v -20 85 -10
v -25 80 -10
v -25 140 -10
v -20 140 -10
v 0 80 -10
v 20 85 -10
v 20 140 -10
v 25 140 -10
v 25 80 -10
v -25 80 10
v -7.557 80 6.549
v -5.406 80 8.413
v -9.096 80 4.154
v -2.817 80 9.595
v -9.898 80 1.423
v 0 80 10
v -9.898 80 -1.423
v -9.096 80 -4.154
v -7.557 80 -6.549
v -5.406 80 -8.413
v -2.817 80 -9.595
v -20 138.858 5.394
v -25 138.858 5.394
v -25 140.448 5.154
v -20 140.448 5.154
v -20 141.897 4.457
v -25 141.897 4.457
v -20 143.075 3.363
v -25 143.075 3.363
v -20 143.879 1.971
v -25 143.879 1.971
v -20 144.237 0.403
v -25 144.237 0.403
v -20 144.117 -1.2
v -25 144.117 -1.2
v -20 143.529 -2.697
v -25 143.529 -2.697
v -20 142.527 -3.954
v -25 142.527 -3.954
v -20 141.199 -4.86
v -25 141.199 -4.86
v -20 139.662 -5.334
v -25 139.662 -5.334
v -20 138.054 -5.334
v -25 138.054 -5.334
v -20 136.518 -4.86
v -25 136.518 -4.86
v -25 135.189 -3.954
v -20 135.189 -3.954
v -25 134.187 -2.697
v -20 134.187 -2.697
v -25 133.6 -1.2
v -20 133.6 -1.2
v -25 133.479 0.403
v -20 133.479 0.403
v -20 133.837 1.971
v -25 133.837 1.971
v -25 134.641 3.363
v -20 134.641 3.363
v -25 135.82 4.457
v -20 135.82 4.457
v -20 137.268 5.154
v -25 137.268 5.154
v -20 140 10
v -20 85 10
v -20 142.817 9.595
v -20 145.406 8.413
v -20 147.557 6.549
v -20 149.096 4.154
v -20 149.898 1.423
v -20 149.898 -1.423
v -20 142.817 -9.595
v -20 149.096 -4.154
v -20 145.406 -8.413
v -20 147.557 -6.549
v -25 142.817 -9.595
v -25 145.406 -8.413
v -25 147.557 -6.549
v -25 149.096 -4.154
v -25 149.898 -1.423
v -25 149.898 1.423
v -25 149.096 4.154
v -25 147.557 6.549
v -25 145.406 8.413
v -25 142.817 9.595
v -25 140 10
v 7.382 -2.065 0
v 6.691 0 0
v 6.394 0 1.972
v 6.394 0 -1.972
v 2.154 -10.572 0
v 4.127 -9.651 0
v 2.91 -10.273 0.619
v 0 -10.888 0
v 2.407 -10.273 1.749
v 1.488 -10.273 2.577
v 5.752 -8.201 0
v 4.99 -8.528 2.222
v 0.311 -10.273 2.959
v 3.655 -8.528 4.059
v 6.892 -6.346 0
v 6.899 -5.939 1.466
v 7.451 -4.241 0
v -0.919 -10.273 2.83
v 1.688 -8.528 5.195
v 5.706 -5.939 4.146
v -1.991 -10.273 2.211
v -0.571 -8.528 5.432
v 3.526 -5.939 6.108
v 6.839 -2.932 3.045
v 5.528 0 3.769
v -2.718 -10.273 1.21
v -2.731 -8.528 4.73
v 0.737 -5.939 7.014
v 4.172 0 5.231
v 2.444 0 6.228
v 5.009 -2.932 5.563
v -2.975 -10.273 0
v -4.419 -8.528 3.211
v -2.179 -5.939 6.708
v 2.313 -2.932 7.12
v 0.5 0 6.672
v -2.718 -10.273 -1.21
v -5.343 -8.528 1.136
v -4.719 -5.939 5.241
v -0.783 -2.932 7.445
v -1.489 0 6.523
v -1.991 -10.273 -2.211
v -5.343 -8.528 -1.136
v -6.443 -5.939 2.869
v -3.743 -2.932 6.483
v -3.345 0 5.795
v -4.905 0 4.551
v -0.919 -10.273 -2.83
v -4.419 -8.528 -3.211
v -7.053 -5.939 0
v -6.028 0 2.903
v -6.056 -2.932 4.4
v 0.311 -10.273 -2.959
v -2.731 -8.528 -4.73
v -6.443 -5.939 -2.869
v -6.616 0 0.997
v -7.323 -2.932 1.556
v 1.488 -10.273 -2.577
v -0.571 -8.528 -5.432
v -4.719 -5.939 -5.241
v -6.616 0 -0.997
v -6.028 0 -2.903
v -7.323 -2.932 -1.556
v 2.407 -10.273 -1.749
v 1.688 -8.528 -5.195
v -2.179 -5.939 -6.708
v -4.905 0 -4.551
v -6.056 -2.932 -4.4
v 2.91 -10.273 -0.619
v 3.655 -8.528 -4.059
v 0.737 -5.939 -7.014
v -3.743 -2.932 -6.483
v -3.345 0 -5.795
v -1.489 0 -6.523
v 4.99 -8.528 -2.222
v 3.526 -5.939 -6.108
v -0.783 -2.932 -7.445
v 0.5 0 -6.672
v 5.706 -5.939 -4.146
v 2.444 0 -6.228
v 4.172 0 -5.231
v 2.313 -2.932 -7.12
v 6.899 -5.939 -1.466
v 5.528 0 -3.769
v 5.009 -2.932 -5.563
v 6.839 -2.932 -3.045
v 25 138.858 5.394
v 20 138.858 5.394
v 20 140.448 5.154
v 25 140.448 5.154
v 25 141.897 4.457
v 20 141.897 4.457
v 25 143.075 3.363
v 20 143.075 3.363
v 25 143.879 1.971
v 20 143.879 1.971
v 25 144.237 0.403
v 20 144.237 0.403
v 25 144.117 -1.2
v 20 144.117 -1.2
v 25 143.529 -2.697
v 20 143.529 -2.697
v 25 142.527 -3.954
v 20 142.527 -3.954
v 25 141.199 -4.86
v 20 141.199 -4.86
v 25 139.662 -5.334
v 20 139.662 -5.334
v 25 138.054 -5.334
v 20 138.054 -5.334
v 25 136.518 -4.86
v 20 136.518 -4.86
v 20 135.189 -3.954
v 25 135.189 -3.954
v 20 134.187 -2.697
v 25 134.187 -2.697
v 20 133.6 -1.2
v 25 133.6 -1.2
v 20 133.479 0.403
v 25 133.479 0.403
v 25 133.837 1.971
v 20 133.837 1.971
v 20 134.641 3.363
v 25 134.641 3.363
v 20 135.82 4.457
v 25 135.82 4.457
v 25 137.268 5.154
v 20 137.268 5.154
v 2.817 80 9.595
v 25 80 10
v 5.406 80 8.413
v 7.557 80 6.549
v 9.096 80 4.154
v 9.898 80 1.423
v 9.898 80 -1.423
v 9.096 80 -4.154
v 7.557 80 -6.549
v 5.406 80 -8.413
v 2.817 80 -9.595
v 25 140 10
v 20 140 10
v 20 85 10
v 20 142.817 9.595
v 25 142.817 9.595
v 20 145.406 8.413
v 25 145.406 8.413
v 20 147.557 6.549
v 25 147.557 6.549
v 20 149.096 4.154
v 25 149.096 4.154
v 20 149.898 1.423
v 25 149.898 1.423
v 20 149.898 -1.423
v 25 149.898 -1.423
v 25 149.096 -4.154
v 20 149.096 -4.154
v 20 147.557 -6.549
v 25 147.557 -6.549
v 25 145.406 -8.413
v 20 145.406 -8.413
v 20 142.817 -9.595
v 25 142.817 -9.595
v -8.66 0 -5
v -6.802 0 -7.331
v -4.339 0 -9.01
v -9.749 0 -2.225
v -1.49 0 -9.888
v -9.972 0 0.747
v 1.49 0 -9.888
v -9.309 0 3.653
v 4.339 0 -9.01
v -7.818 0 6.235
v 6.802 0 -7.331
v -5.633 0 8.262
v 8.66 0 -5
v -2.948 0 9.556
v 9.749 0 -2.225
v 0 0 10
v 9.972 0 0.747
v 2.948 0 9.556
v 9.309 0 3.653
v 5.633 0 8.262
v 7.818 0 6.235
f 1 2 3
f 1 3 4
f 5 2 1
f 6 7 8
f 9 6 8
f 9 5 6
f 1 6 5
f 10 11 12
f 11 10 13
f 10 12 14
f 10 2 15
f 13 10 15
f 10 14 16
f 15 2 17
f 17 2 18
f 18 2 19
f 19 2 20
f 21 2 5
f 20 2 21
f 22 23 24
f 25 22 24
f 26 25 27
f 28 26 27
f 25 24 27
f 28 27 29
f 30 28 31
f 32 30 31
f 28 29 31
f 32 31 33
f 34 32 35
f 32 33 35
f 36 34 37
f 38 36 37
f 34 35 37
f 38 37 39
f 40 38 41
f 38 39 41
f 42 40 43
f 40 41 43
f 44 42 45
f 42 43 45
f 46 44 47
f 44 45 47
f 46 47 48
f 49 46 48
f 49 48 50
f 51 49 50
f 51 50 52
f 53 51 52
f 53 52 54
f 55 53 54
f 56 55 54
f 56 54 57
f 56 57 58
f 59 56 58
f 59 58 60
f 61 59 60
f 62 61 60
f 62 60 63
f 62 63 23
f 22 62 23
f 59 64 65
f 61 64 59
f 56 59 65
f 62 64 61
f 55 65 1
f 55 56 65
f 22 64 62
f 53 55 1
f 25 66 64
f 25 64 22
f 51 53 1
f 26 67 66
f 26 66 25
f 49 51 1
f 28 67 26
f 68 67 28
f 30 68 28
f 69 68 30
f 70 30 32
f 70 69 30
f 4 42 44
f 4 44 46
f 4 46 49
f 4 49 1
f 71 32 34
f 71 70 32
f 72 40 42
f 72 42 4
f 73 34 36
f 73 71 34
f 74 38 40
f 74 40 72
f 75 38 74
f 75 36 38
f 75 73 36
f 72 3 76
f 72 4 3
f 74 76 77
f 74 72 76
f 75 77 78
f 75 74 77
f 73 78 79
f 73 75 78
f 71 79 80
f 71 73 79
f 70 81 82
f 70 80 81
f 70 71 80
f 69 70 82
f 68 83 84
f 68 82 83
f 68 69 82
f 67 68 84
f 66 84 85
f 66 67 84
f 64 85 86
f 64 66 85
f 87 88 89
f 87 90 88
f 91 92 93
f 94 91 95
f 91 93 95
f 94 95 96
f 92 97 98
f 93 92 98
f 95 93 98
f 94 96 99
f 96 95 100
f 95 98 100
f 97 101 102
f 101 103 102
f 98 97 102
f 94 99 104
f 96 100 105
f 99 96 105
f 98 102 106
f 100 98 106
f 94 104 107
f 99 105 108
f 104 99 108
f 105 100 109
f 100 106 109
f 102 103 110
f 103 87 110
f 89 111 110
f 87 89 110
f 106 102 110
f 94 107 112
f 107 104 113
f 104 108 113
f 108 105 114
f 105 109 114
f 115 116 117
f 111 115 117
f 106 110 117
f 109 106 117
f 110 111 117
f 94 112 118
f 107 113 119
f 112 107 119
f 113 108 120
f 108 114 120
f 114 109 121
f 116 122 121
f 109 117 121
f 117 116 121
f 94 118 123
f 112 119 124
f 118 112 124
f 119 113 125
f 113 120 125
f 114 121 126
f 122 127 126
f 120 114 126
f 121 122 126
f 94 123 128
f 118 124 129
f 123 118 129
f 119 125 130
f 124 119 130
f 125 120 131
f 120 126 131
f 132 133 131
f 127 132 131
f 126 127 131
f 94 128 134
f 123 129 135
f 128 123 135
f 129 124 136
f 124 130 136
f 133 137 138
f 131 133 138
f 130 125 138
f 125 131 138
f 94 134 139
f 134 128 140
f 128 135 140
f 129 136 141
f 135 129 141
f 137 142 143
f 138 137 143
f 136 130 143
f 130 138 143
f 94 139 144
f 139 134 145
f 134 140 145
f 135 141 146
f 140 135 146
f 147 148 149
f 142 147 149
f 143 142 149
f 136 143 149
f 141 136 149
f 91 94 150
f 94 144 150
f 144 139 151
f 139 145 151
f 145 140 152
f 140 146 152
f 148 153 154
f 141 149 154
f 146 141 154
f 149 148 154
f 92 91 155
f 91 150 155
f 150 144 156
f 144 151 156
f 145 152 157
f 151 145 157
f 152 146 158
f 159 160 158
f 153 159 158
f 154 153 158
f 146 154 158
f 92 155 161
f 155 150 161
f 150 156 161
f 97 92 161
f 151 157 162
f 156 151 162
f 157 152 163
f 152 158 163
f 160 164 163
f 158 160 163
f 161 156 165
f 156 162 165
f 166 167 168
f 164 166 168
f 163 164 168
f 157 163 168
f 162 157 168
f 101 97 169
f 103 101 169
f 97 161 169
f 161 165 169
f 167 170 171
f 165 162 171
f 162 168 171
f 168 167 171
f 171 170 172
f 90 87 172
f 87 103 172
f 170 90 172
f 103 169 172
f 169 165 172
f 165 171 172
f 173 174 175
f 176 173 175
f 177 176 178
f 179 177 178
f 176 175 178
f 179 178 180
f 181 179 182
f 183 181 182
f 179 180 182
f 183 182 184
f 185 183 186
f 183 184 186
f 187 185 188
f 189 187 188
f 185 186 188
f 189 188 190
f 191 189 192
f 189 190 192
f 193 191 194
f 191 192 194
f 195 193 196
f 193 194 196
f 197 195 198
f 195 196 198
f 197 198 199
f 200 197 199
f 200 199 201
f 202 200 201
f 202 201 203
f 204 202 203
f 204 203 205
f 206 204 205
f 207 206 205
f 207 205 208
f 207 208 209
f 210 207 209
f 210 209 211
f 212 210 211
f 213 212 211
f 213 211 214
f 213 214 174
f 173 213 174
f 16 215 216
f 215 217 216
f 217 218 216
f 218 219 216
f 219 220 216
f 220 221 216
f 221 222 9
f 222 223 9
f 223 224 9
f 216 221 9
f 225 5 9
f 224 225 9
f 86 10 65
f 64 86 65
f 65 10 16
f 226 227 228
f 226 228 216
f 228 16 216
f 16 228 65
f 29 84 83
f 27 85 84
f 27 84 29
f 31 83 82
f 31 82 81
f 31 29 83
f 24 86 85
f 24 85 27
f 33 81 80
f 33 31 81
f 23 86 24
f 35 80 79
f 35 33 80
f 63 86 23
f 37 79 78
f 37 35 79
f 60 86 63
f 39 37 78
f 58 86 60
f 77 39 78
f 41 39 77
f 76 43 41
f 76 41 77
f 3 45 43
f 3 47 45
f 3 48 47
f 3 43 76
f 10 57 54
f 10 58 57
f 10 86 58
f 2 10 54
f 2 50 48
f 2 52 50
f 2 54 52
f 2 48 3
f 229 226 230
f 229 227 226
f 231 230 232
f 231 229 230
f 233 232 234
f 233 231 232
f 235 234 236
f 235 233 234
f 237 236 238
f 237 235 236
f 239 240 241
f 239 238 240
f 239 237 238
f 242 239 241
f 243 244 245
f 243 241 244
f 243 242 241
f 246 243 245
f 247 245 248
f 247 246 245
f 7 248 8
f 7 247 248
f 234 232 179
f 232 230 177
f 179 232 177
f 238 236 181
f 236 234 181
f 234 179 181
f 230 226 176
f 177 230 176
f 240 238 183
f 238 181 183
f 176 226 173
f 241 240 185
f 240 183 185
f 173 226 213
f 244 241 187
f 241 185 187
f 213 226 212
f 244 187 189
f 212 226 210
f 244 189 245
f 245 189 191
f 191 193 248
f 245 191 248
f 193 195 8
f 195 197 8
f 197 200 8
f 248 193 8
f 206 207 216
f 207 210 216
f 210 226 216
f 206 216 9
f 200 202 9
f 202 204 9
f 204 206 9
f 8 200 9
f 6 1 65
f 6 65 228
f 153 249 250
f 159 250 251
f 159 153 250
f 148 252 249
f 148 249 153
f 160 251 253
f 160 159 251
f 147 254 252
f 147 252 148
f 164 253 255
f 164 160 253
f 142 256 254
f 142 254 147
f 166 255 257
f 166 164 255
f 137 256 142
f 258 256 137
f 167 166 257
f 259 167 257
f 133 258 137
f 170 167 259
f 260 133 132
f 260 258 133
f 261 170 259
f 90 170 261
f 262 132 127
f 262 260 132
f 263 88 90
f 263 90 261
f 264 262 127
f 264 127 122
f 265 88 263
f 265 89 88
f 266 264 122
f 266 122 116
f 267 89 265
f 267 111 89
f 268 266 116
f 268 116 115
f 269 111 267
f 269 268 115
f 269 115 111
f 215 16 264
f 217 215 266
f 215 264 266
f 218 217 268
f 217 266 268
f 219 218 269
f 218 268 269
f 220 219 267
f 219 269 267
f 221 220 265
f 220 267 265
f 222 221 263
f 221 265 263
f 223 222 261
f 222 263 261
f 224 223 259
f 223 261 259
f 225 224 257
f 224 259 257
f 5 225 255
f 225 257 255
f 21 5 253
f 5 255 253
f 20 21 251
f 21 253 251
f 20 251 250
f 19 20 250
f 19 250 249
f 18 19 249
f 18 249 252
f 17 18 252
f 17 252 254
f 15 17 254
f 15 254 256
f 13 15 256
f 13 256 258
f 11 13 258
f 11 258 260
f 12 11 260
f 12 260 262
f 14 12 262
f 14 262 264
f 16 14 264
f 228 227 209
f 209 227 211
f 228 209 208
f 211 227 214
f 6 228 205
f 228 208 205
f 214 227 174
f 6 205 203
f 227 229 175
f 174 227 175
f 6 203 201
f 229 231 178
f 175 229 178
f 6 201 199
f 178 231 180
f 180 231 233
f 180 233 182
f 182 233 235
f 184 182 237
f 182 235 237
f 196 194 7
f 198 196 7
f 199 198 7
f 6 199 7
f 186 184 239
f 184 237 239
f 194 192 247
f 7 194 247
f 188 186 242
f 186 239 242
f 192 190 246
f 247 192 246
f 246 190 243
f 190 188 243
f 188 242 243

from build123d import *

# Parameters (mm, degrees)
SKETCH_1_R          = 10
SKETCH_1_R_2        = 7.5
EXTRUDE_1_DEPTH     = 80
SKETCH_2_W          = 50
SKETCH_2_H          = 20
EXTRUDE_2_DEPTH     = 70
SKETCH_3_W          = 40
SKETCH_3_H          = 20
CUT_EXTRUDE_1_DEPTH = 65
SKETCH_4_R          = 5.393818753
CUT_EXTRUDE_2_DEPTH = 159.429795178
FILLET_1_RADIUS     = 10
FILLET_1_LENGTH     = 5
FILLET_2_RADIUS     = 10
FILLET_2_LENGTH     = 5
EXTRUDE_START       = 80
SKETCH_5_R          = 7.5
EXTRUDE_3_DEPTH     = 80


with BuildPart() as part:
    # 草图1 → 凸台-拉伸1 (new body)
    with BuildSketch(Plane(origin=(0, 0, 0), x_dir=(1, 0, 0), z_dir=(0, 1, 0))):
        with Locations(Location((0, 0, 0), (0, 0, 270))):
            Circle(SKETCH_1_R)
        with Locations(Location((0, 0, 0), (0, 0, 270))):
            Circle(SKETCH_1_R_2, mode=Mode.SUBTRACT)
    extrude(amount=EXTRUDE_1_DEPTH)

    # 草图2 → 凸台-拉伸2 (add)
    with BuildSketch(Plane(origin=(0, 80, 0), x_dir=(1, 0, 0), z_dir=(0, 1, 0))):
        Rectangle(SKETCH_2_W, SKETCH_2_H)
    extrude(amount=EXTRUDE_2_DEPTH)

    # 草图3 → 切除-拉伸1 (cut)
    with BuildSketch(Plane(origin=(0, 150, 0), x_dir=(1, 0, 0), z_dir=(0, 1, 0))):
        Rectangle(SKETCH_3_W, SKETCH_3_H)
    extrude(amount=-CUT_EXTRUDE_1_DEPTH, mode=Mode.SUBTRACT)

    # 草图4 → 切除-拉伸2 (cut, through all)
    with BuildSketch(Plane.ZY.offset(25)):
        with Locations((0, 138.858219845)):
            Circle(SKETCH_4_R)
    extrude(amount=-CUT_EXTRUDE_2_DEPTH, mode=Mode.SUBTRACT)

    # 圆角1: full round fillet: the end face becomes a half cylinder, R = half its width
    fillet_1_face = Plane((-22.5, 150, 0), x_dir=(1, 0, 0), z_dir=(0, 1, 0))  # on the end face: x along it, z out of the body
    fillet_1_slab = fillet_1_face.offset(-FILLET_1_RADIUS / 2) * Box(FILLET_1_LENGTH, 2 * FILLET_1_RADIUS, FILLET_1_RADIUS, mode=Mode.PRIVATE)  # the body's end, R deep
    fillet_1_round = Plane((-22.5, 140, 0), x_dir=(0, 1, 0), z_dir=(1, 0, 0)) * Cylinder(FILLET_1_RADIUS, FILLET_1_LENGTH, mode=Mode.PRIVATE)  # its axis R under the face
    add(fillet_1_slab - fillet_1_round, mode=Mode.SUBTRACT)

    # 圆角2: full round fillet: the end face becomes a half cylinder, R = half its width
    fillet_2_face = Plane((22.5, 150, 0), x_dir=(-1, 0, 0), z_dir=(0, 1, 0))  # on the end face: x along it, z out of the body
    fillet_2_slab = fillet_2_face.offset(-FILLET_2_RADIUS / 2) * Box(FILLET_2_LENGTH, 2 * FILLET_2_RADIUS, FILLET_2_RADIUS, mode=Mode.PRIVATE)  # the body's end, R deep
    fillet_2_round = Plane((22.5, 140, 0), x_dir=(0, 1, 0), z_dir=(-1, 0, 0)) * Cylinder(FILLET_2_RADIUS, FILLET_2_LENGTH, mode=Mode.PRIVATE)  # its axis R under the face
    add(fillet_2_slab - fillet_2_round, mode=Mode.SUBTRACT)

    # 草图5 → 凸台-拉伸3 (add)
    with BuildSketch(Plane.XZ.offset(-80).offset(EXTRUDE_START)):
        Circle(SKETCH_5_R)
    extrude(amount=-EXTRUDE_3_DEPTH)

    # 草图6 → 旋转1 (revolve)
    with BuildSketch(Plane.XY):
        with BuildLine():
            Line((0, 4.111647453), (0, -10.888352547))
            ThreePointArc((0, -10.888352547), (7.5, -3.388352547), (0, 4.111647453))
        make_face()
    revolve(axis=Axis((0, 4.111647453, 0), (0, -1, 0)))


solid = part.part
